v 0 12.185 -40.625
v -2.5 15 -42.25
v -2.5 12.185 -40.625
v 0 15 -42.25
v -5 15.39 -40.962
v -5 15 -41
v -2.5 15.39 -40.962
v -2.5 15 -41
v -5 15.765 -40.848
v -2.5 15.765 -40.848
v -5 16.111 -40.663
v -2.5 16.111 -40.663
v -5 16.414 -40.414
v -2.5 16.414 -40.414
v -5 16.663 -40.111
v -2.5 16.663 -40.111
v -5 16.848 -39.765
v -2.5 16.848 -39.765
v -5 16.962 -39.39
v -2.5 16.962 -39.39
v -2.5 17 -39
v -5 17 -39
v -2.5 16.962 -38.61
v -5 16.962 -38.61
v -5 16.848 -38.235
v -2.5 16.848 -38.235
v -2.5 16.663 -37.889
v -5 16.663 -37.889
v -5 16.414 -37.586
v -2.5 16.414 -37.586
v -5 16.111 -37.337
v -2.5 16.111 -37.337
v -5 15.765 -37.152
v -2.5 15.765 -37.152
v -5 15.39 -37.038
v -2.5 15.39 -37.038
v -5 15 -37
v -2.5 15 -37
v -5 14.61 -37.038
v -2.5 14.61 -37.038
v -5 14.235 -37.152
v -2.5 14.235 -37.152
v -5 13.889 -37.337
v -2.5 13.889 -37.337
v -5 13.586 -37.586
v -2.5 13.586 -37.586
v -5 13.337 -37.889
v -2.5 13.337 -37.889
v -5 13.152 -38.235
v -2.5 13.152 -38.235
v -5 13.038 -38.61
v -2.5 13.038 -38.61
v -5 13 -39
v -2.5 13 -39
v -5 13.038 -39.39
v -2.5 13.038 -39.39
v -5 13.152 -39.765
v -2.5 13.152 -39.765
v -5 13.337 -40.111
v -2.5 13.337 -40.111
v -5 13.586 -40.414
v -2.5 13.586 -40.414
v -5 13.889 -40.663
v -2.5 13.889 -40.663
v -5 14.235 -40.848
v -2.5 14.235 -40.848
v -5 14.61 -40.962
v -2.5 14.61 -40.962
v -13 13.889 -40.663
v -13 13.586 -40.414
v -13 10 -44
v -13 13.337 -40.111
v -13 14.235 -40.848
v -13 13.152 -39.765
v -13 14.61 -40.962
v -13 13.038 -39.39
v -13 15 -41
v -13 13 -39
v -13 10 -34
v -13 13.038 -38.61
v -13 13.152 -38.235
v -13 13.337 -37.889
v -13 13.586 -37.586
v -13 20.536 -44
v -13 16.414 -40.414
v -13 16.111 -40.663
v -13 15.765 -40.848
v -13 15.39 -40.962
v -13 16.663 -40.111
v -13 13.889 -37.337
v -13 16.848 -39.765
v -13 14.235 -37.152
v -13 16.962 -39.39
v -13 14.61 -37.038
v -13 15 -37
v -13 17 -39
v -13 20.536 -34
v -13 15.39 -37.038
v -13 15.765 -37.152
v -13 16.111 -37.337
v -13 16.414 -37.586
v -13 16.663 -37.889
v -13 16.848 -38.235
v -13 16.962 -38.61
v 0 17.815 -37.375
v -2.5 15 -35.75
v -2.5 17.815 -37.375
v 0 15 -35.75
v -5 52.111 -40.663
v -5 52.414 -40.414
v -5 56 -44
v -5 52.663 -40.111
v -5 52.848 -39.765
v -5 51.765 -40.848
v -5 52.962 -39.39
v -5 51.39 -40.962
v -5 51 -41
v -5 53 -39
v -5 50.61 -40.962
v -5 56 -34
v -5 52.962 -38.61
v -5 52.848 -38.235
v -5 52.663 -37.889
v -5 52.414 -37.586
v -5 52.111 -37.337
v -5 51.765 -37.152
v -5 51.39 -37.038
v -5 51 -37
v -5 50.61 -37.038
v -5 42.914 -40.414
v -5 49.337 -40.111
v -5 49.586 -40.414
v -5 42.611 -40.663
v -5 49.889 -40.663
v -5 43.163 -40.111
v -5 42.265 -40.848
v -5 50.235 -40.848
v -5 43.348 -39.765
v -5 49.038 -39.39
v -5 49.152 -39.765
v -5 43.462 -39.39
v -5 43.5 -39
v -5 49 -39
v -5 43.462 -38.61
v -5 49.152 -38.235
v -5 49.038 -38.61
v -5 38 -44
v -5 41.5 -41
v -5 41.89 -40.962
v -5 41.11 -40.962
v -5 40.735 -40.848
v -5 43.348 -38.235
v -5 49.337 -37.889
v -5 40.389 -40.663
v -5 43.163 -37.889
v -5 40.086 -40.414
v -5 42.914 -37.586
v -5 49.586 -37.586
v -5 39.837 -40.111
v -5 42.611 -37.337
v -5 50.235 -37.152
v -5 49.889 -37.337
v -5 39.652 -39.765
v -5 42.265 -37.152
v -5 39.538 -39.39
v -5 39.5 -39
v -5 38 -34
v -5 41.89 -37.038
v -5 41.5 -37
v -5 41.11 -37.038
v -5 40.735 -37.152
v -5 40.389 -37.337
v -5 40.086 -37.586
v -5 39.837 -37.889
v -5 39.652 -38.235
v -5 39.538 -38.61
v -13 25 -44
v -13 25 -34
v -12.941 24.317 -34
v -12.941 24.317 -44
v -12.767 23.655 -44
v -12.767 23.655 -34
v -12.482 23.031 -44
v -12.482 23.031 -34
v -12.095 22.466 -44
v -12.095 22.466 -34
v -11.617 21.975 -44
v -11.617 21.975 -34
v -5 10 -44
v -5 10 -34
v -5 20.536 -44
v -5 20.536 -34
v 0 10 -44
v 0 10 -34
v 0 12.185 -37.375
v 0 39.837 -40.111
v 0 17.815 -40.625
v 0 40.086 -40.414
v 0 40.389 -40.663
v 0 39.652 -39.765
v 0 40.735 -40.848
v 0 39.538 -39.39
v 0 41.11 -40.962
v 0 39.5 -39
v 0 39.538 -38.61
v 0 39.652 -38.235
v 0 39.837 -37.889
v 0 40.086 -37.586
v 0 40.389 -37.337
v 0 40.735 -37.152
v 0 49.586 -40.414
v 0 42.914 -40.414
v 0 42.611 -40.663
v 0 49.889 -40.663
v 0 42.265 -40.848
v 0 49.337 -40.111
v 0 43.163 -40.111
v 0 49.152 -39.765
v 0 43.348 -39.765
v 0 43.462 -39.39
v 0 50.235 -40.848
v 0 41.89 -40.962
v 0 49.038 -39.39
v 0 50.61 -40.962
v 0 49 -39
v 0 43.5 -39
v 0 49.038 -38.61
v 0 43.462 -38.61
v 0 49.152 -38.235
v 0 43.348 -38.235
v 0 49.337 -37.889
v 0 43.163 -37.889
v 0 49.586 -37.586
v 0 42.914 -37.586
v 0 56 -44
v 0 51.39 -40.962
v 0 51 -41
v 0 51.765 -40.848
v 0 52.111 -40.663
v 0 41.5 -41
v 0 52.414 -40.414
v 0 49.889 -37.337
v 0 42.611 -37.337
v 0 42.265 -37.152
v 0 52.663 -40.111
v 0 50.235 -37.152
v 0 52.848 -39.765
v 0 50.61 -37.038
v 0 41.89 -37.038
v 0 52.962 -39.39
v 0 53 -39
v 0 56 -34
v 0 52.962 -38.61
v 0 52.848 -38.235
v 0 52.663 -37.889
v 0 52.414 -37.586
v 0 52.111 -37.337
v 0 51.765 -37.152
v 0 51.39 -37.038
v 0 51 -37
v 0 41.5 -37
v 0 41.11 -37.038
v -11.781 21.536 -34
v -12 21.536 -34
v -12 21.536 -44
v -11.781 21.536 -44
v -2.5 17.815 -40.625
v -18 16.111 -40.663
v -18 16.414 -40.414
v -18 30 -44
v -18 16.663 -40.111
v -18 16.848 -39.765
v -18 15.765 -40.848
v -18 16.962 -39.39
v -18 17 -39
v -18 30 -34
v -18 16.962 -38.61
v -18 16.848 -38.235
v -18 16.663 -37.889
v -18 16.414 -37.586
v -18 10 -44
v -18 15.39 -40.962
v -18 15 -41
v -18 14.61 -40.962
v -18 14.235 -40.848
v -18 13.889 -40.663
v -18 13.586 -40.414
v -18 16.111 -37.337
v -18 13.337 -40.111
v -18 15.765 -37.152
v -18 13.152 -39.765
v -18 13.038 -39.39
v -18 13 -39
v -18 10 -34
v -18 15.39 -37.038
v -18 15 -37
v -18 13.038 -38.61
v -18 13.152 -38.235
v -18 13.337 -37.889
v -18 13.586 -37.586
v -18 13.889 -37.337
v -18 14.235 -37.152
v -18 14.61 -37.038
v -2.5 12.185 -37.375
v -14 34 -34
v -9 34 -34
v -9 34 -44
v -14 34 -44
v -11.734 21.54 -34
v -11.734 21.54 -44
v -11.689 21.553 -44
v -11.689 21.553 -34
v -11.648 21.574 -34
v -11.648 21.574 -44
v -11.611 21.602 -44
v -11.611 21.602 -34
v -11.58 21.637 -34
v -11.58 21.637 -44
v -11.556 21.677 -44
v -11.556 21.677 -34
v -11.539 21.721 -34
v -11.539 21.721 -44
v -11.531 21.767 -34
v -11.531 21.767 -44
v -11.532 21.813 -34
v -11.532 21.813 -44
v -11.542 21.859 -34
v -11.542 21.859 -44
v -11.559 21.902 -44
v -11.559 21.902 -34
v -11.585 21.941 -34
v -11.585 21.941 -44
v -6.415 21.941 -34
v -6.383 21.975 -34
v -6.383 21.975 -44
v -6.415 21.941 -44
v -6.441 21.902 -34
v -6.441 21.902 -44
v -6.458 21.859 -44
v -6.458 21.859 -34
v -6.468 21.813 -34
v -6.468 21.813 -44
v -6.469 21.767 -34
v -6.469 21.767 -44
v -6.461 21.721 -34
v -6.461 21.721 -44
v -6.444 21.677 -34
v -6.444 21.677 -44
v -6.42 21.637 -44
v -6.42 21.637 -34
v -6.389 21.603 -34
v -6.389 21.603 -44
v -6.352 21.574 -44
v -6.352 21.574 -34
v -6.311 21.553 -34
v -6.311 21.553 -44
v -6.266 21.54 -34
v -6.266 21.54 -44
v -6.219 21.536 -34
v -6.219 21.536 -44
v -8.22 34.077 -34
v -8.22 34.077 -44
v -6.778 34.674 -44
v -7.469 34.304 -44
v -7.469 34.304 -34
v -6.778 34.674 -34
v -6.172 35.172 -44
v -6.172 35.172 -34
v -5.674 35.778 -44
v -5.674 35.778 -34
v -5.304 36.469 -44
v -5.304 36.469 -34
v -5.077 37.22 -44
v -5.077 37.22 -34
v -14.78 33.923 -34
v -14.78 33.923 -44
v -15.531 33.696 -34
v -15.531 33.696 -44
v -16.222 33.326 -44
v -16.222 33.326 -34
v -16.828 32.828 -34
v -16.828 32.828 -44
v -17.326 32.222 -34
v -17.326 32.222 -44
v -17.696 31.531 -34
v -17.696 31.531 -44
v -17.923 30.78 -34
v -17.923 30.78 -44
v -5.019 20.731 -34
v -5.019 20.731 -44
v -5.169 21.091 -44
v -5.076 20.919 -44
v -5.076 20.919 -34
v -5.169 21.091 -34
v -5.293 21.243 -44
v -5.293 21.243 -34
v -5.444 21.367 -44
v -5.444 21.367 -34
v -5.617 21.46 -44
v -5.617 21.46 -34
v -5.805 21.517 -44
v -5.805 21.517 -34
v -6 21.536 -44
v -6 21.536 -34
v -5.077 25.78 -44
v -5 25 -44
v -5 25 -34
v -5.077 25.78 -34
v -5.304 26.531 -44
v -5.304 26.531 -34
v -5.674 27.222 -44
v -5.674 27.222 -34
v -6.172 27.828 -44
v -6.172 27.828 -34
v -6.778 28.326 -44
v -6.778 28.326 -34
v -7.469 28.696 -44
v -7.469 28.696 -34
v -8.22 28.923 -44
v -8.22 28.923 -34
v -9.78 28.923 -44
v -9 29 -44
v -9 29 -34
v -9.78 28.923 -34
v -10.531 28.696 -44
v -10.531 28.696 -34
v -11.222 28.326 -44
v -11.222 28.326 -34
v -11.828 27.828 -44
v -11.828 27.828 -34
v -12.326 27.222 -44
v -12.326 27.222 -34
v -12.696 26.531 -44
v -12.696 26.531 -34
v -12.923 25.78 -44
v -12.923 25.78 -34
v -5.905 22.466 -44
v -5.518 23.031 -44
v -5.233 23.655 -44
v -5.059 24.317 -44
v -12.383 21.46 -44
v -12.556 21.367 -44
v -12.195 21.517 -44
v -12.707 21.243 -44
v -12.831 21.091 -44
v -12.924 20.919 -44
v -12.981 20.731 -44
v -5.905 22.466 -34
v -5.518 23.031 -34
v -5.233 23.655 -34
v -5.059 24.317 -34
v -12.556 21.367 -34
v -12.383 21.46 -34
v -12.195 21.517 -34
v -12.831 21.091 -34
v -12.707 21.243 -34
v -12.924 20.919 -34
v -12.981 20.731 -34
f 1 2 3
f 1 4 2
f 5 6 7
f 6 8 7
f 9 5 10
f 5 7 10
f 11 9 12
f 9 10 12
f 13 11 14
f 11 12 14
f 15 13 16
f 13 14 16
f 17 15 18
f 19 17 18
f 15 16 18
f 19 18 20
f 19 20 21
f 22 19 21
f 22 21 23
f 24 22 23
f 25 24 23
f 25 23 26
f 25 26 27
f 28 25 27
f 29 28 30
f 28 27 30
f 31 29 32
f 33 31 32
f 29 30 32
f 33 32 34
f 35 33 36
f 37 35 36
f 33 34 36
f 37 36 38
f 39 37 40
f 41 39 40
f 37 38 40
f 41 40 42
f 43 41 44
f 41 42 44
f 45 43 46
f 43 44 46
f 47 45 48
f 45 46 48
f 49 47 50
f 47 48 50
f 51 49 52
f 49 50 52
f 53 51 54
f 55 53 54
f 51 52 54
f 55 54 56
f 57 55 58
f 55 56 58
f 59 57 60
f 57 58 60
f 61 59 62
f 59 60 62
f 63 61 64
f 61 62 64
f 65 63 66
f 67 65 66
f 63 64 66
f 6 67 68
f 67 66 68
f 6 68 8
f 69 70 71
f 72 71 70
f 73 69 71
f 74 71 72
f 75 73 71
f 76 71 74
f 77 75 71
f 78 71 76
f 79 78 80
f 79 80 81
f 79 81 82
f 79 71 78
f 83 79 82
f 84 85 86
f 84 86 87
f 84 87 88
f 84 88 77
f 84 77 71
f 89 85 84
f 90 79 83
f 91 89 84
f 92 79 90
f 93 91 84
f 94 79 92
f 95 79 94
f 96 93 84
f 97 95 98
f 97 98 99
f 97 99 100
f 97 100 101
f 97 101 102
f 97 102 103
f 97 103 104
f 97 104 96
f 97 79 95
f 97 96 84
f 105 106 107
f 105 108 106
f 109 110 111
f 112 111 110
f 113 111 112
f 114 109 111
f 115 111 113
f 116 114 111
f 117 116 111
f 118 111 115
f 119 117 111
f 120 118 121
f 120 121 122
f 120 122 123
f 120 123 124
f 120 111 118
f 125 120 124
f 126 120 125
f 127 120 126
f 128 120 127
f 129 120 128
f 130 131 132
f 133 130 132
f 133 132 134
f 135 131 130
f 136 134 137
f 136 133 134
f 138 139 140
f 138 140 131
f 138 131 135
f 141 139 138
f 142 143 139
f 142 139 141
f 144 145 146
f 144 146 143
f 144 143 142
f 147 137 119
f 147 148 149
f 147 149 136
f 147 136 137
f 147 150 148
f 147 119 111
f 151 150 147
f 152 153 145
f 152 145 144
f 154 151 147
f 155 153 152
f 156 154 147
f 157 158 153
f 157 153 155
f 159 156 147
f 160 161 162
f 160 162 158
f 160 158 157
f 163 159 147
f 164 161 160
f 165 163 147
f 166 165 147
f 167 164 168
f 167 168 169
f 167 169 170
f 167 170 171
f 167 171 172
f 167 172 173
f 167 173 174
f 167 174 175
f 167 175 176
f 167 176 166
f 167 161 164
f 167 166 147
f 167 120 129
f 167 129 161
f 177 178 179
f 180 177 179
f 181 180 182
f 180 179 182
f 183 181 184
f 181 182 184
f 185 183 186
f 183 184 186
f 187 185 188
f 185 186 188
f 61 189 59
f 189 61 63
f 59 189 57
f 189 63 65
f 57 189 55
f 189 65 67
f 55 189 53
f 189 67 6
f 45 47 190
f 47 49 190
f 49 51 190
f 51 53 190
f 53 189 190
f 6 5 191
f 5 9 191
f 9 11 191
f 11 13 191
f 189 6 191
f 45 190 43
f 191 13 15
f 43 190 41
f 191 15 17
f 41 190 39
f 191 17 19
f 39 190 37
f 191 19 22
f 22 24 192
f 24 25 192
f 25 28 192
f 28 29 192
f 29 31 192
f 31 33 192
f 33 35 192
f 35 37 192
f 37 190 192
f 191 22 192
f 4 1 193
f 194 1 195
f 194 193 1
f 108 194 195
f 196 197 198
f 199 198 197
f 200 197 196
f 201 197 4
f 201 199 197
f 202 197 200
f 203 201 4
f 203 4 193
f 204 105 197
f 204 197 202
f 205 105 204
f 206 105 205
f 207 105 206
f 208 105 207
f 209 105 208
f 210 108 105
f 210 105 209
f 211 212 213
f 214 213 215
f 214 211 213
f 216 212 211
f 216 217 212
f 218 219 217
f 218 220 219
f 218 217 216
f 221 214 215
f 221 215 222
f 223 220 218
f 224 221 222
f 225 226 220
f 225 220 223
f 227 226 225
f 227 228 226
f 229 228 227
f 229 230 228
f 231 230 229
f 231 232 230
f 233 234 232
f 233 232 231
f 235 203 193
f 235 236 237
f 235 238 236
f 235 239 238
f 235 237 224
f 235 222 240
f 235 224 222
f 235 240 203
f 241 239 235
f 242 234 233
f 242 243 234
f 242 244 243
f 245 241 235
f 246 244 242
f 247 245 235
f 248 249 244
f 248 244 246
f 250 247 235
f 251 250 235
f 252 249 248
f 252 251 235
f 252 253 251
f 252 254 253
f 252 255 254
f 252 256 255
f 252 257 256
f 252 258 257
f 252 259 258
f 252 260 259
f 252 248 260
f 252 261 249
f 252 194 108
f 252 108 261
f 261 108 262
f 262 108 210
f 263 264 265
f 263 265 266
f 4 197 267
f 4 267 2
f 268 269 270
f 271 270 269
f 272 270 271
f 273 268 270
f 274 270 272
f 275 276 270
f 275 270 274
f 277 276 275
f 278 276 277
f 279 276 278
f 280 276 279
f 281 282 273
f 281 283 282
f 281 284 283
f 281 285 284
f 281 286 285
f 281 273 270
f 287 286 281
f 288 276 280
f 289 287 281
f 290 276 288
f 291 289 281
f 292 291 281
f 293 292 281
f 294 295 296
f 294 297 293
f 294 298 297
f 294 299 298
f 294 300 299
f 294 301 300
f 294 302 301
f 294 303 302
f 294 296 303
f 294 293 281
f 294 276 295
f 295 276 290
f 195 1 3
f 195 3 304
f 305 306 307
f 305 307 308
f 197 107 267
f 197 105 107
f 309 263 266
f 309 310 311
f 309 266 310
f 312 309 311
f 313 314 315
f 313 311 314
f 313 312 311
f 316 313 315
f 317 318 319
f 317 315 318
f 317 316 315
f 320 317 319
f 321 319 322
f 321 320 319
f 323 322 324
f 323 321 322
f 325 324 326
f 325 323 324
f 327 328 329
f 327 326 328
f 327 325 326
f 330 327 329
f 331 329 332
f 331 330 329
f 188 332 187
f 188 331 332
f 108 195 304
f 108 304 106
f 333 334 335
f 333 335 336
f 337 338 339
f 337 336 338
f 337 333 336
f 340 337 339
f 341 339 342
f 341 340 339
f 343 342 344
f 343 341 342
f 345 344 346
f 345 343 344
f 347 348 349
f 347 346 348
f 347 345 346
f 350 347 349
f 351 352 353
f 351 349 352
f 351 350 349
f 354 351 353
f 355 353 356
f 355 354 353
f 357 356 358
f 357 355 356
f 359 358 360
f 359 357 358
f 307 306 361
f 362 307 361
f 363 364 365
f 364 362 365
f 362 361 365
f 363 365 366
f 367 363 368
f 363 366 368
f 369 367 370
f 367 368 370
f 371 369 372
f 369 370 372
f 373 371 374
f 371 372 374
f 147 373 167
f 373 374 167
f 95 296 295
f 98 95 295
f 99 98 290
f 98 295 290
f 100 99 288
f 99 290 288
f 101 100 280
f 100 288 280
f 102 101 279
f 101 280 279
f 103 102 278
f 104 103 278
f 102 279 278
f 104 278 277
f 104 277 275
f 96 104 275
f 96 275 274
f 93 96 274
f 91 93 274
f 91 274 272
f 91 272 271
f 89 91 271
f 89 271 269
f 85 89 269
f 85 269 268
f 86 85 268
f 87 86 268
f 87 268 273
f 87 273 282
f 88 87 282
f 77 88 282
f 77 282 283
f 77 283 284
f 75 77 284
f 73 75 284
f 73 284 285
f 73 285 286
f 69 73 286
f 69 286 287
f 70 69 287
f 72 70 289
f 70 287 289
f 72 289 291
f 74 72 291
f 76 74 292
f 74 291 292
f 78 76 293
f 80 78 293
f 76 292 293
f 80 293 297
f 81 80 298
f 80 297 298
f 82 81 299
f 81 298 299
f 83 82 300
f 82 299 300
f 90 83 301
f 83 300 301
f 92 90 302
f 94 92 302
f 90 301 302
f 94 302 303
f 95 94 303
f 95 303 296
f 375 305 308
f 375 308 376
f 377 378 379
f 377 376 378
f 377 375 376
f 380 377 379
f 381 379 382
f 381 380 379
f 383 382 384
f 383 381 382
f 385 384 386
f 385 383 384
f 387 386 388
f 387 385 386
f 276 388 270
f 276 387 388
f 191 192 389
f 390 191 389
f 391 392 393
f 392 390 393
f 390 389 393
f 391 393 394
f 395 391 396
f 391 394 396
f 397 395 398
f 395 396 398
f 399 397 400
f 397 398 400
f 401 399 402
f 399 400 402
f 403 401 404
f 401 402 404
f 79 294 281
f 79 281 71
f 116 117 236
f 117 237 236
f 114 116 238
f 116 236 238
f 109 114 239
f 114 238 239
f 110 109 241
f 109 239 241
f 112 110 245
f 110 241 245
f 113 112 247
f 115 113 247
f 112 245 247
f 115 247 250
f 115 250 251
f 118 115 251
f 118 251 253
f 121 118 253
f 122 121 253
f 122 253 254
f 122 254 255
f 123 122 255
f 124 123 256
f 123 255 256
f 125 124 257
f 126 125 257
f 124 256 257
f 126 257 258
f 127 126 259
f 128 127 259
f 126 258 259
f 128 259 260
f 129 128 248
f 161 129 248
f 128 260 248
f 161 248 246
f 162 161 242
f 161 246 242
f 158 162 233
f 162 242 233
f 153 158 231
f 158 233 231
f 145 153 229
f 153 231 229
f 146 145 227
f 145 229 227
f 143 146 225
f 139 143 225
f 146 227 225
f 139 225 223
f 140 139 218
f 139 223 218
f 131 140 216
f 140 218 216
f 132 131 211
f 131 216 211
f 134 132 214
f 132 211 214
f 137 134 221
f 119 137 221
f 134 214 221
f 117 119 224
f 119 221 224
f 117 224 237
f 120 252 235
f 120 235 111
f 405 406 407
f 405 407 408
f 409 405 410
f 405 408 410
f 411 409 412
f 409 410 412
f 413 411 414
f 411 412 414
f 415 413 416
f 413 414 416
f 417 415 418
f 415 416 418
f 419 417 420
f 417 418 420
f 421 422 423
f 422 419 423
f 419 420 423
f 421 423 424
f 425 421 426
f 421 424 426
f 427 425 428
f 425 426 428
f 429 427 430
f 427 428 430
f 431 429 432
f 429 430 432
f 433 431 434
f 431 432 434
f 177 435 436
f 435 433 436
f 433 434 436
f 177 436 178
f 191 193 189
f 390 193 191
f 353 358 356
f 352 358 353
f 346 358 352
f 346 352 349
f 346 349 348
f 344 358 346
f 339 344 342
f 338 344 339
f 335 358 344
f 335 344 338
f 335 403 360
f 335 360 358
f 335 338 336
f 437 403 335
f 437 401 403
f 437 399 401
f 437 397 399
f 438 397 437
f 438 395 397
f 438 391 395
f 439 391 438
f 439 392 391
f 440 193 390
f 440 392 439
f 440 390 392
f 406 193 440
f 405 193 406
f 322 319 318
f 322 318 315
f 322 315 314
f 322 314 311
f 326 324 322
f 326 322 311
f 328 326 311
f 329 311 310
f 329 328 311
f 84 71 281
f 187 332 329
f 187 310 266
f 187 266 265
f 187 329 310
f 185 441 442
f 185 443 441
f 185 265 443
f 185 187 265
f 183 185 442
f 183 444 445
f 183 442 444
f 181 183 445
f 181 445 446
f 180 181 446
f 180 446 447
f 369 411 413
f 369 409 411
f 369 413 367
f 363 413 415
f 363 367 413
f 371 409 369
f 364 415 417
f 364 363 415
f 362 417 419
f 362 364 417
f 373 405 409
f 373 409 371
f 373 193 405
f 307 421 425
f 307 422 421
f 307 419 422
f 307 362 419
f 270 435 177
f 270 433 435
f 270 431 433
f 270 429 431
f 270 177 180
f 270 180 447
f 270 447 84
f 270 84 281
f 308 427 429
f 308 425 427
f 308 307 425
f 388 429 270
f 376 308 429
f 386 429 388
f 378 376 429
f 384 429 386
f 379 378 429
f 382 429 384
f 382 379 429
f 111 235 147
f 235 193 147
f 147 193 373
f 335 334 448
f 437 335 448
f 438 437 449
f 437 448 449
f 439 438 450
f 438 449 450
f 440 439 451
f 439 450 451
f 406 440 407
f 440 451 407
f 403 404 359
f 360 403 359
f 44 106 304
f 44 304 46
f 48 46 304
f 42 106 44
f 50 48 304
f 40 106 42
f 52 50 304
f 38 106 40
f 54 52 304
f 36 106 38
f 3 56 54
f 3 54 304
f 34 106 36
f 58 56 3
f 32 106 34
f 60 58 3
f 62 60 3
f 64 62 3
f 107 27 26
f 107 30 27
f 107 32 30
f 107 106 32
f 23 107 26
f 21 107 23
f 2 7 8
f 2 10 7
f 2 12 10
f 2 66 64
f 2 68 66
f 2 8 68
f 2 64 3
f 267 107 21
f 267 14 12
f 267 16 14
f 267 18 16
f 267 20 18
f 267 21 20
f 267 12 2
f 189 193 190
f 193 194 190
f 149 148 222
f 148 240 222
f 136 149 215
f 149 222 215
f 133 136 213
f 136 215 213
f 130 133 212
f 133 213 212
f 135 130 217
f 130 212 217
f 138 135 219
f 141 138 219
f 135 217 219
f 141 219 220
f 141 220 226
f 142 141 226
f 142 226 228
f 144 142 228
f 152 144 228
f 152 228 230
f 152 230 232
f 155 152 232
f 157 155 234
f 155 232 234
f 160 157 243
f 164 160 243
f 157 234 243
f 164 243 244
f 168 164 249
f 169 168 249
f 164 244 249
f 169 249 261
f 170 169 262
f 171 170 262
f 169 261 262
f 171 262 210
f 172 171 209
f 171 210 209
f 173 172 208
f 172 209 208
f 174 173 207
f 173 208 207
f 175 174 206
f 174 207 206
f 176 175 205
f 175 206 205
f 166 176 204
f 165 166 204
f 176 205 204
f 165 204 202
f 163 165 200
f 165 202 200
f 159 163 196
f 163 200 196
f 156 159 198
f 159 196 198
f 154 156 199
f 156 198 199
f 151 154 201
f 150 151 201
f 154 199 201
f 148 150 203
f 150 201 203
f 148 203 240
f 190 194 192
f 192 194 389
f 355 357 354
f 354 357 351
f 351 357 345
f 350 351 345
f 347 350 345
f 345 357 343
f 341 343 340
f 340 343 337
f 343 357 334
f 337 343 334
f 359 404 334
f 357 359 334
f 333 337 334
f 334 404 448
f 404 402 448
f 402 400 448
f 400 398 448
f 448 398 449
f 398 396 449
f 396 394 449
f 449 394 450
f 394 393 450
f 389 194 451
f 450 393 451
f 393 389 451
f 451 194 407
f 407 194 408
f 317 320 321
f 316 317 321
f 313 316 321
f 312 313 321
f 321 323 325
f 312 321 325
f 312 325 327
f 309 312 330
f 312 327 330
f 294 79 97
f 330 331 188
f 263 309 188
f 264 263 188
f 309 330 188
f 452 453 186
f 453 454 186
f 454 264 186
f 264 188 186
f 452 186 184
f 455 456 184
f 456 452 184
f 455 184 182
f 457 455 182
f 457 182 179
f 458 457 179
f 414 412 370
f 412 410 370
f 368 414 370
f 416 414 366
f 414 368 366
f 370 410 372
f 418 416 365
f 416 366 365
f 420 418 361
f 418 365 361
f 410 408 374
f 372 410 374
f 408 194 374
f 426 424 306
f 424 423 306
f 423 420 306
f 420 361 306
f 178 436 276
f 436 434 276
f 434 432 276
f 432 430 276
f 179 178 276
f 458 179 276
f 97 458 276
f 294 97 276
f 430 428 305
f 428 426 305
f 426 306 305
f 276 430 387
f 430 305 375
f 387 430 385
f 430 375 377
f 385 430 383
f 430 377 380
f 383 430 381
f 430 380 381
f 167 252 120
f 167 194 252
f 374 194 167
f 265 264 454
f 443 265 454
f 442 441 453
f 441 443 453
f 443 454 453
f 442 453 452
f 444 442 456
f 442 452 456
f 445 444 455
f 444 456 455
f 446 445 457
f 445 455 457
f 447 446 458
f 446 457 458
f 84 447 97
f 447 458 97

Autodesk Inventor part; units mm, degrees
ref_plane "YZ Plane" through (0, 0, 0) normal (1, 0, 0) x (0, 1, 0)
ref_plane "XZ Plane" through (0, 0, 0) normal (0, 1, 0) x (-1, 0, 0)
ref_plane "XY Plane" through (0, 0, 0) normal (0, 0, 1) x (1, 0, 0)
sketch "Sketch1" plane through (0, 0, 0) normal (0, 1, 0) x (-1, 0, 0)
  line L0 (0, 2) -> (5, 2)
  line L1 (5, 2) -> (5, -16)
  line L2 (0, -20) -> (0, 2)
  line L3 (0, -44) -> (5, -44)
  line L4 (5, -44) -> (5, -33.4641)
  arc A0 (13, -29) -> (5, -29) centre (9, -29) ccw
  line L5 (9, -20) -> (14, -20)
  line L6 (18, -44) -> (13, -44)
  line L7 (13, -44) -> (13, -33.4641)
  line L8 (18, -24) -> (18, -44)
  line L9 (0, -20) -> (0, -44)
  arc A1 (5, -16) -> (9, -20) centre (9, -16) ccw
  arc A2 (18, -24) -> (14, -20) centre (14, -24) ccw
  circle A3 centre (9, -29) radius 4 construction
  line L10 (6, -32.4641) -> (6.2193, -32.4641)
  line L11 (12, -32.4641) -> (11.7807, -32.4641)
  arc A4 (5, -29) -> (6.3829, -32.025) centre (9, -29) ccw
  arc A5 (11.6171, -32.025) -> (13, -29) centre (9, -29) ccw
  arc A6 (6.2193, -32.4641) -> (6.3829, -32.025) centre (6.2193, -32.2141) ccw
  arc A7 (11.6171, -32.025) -> (11.7807, -32.4641) centre (11.7807, -32.2141) ccw
  arc A8 (6, -32.4641) -> (5, -33.4641) centre (6, -33.4641) ccw
  arc A9 (13, -33.4641) -> (12, -32.4641) centre (12, -33.4641) ccw
  point P0 (0, 0)
  point P1 (7, -32.4641)
  point P2 (11, -32.4641)
  dimension "d45" = 1
extrude "Extrusion1" add sketch "Sketch1" along normal blind 10
move or copy body "Move Body1" bodies to move or copy 1 copy no rotation origin (0, 0, 0) rotation axis (1, 0, 0) rotation angle -90 translate (0, 54, -34)
sketch "Sketch4" plane through (0, 10, -34) normal (1, 0, 0) x (0, 0, -1)
  line L0 (0, 46) -> (10, 46) construction
  line L1 (5, 46) -> (5, 41) construction
  circle A0 centre (5, 41) radius 2
  circle A1 centre (5, 31.5) radius 2
  circle A2 centre (5, 5) radius 2
  dimension "d29" = 5
  dimension "d30" = 4
  dimension "d31" = 4
  dimension "d32" = 4
extrude "Extrusion3" cut sketch "Sketch4" against normal blind 5
sketch "Sketch5" plane through (0, 10, -34) normal (1, 0, 0) x (0, 0, -1)
  circle A0 centre (5, 5) radius 2 construction
  circle A1 centre (5, 5) radius 3.25 construction
  line L0 (8.25, 5) -> (6.625, 2.1854)
  line L1 (6.625, 2.1854) -> (3.375, 2.1854)
  line L2 (3.375, 2.1854) -> (1.75, 5)
  line L3 (1.75, 5) -> (3.375, 7.8146)
  line L4 (3.375, 7.8146) -> (6.625, 7.8146)
  line L5 (6.625, 7.8146) -> (8.25, 5)
  point P0 (-34, -10)
  dimension "d35" = 6.5
extrude "Extrusion4" cut sketch "Sketch5" against normal blind 2.5
sketch "Sketch6" plane through (-18, 10, -34) normal (-1, 0, 0) x (0, 0, 1)
  line L0 (0, 0) -> (-10, 0) construction
  line L1 (-5, 0) -> (-5, 5) construction
  circle A0 centre (-5, 5) radius 2
  point P0 (34, -10)
  dimension "d38" = 5
  dimension "d39" = 4
extrude "Extrusion5" cut sketch "Sketch6" against normal blind 5
properties part number "Camera_Bed_Detector"
